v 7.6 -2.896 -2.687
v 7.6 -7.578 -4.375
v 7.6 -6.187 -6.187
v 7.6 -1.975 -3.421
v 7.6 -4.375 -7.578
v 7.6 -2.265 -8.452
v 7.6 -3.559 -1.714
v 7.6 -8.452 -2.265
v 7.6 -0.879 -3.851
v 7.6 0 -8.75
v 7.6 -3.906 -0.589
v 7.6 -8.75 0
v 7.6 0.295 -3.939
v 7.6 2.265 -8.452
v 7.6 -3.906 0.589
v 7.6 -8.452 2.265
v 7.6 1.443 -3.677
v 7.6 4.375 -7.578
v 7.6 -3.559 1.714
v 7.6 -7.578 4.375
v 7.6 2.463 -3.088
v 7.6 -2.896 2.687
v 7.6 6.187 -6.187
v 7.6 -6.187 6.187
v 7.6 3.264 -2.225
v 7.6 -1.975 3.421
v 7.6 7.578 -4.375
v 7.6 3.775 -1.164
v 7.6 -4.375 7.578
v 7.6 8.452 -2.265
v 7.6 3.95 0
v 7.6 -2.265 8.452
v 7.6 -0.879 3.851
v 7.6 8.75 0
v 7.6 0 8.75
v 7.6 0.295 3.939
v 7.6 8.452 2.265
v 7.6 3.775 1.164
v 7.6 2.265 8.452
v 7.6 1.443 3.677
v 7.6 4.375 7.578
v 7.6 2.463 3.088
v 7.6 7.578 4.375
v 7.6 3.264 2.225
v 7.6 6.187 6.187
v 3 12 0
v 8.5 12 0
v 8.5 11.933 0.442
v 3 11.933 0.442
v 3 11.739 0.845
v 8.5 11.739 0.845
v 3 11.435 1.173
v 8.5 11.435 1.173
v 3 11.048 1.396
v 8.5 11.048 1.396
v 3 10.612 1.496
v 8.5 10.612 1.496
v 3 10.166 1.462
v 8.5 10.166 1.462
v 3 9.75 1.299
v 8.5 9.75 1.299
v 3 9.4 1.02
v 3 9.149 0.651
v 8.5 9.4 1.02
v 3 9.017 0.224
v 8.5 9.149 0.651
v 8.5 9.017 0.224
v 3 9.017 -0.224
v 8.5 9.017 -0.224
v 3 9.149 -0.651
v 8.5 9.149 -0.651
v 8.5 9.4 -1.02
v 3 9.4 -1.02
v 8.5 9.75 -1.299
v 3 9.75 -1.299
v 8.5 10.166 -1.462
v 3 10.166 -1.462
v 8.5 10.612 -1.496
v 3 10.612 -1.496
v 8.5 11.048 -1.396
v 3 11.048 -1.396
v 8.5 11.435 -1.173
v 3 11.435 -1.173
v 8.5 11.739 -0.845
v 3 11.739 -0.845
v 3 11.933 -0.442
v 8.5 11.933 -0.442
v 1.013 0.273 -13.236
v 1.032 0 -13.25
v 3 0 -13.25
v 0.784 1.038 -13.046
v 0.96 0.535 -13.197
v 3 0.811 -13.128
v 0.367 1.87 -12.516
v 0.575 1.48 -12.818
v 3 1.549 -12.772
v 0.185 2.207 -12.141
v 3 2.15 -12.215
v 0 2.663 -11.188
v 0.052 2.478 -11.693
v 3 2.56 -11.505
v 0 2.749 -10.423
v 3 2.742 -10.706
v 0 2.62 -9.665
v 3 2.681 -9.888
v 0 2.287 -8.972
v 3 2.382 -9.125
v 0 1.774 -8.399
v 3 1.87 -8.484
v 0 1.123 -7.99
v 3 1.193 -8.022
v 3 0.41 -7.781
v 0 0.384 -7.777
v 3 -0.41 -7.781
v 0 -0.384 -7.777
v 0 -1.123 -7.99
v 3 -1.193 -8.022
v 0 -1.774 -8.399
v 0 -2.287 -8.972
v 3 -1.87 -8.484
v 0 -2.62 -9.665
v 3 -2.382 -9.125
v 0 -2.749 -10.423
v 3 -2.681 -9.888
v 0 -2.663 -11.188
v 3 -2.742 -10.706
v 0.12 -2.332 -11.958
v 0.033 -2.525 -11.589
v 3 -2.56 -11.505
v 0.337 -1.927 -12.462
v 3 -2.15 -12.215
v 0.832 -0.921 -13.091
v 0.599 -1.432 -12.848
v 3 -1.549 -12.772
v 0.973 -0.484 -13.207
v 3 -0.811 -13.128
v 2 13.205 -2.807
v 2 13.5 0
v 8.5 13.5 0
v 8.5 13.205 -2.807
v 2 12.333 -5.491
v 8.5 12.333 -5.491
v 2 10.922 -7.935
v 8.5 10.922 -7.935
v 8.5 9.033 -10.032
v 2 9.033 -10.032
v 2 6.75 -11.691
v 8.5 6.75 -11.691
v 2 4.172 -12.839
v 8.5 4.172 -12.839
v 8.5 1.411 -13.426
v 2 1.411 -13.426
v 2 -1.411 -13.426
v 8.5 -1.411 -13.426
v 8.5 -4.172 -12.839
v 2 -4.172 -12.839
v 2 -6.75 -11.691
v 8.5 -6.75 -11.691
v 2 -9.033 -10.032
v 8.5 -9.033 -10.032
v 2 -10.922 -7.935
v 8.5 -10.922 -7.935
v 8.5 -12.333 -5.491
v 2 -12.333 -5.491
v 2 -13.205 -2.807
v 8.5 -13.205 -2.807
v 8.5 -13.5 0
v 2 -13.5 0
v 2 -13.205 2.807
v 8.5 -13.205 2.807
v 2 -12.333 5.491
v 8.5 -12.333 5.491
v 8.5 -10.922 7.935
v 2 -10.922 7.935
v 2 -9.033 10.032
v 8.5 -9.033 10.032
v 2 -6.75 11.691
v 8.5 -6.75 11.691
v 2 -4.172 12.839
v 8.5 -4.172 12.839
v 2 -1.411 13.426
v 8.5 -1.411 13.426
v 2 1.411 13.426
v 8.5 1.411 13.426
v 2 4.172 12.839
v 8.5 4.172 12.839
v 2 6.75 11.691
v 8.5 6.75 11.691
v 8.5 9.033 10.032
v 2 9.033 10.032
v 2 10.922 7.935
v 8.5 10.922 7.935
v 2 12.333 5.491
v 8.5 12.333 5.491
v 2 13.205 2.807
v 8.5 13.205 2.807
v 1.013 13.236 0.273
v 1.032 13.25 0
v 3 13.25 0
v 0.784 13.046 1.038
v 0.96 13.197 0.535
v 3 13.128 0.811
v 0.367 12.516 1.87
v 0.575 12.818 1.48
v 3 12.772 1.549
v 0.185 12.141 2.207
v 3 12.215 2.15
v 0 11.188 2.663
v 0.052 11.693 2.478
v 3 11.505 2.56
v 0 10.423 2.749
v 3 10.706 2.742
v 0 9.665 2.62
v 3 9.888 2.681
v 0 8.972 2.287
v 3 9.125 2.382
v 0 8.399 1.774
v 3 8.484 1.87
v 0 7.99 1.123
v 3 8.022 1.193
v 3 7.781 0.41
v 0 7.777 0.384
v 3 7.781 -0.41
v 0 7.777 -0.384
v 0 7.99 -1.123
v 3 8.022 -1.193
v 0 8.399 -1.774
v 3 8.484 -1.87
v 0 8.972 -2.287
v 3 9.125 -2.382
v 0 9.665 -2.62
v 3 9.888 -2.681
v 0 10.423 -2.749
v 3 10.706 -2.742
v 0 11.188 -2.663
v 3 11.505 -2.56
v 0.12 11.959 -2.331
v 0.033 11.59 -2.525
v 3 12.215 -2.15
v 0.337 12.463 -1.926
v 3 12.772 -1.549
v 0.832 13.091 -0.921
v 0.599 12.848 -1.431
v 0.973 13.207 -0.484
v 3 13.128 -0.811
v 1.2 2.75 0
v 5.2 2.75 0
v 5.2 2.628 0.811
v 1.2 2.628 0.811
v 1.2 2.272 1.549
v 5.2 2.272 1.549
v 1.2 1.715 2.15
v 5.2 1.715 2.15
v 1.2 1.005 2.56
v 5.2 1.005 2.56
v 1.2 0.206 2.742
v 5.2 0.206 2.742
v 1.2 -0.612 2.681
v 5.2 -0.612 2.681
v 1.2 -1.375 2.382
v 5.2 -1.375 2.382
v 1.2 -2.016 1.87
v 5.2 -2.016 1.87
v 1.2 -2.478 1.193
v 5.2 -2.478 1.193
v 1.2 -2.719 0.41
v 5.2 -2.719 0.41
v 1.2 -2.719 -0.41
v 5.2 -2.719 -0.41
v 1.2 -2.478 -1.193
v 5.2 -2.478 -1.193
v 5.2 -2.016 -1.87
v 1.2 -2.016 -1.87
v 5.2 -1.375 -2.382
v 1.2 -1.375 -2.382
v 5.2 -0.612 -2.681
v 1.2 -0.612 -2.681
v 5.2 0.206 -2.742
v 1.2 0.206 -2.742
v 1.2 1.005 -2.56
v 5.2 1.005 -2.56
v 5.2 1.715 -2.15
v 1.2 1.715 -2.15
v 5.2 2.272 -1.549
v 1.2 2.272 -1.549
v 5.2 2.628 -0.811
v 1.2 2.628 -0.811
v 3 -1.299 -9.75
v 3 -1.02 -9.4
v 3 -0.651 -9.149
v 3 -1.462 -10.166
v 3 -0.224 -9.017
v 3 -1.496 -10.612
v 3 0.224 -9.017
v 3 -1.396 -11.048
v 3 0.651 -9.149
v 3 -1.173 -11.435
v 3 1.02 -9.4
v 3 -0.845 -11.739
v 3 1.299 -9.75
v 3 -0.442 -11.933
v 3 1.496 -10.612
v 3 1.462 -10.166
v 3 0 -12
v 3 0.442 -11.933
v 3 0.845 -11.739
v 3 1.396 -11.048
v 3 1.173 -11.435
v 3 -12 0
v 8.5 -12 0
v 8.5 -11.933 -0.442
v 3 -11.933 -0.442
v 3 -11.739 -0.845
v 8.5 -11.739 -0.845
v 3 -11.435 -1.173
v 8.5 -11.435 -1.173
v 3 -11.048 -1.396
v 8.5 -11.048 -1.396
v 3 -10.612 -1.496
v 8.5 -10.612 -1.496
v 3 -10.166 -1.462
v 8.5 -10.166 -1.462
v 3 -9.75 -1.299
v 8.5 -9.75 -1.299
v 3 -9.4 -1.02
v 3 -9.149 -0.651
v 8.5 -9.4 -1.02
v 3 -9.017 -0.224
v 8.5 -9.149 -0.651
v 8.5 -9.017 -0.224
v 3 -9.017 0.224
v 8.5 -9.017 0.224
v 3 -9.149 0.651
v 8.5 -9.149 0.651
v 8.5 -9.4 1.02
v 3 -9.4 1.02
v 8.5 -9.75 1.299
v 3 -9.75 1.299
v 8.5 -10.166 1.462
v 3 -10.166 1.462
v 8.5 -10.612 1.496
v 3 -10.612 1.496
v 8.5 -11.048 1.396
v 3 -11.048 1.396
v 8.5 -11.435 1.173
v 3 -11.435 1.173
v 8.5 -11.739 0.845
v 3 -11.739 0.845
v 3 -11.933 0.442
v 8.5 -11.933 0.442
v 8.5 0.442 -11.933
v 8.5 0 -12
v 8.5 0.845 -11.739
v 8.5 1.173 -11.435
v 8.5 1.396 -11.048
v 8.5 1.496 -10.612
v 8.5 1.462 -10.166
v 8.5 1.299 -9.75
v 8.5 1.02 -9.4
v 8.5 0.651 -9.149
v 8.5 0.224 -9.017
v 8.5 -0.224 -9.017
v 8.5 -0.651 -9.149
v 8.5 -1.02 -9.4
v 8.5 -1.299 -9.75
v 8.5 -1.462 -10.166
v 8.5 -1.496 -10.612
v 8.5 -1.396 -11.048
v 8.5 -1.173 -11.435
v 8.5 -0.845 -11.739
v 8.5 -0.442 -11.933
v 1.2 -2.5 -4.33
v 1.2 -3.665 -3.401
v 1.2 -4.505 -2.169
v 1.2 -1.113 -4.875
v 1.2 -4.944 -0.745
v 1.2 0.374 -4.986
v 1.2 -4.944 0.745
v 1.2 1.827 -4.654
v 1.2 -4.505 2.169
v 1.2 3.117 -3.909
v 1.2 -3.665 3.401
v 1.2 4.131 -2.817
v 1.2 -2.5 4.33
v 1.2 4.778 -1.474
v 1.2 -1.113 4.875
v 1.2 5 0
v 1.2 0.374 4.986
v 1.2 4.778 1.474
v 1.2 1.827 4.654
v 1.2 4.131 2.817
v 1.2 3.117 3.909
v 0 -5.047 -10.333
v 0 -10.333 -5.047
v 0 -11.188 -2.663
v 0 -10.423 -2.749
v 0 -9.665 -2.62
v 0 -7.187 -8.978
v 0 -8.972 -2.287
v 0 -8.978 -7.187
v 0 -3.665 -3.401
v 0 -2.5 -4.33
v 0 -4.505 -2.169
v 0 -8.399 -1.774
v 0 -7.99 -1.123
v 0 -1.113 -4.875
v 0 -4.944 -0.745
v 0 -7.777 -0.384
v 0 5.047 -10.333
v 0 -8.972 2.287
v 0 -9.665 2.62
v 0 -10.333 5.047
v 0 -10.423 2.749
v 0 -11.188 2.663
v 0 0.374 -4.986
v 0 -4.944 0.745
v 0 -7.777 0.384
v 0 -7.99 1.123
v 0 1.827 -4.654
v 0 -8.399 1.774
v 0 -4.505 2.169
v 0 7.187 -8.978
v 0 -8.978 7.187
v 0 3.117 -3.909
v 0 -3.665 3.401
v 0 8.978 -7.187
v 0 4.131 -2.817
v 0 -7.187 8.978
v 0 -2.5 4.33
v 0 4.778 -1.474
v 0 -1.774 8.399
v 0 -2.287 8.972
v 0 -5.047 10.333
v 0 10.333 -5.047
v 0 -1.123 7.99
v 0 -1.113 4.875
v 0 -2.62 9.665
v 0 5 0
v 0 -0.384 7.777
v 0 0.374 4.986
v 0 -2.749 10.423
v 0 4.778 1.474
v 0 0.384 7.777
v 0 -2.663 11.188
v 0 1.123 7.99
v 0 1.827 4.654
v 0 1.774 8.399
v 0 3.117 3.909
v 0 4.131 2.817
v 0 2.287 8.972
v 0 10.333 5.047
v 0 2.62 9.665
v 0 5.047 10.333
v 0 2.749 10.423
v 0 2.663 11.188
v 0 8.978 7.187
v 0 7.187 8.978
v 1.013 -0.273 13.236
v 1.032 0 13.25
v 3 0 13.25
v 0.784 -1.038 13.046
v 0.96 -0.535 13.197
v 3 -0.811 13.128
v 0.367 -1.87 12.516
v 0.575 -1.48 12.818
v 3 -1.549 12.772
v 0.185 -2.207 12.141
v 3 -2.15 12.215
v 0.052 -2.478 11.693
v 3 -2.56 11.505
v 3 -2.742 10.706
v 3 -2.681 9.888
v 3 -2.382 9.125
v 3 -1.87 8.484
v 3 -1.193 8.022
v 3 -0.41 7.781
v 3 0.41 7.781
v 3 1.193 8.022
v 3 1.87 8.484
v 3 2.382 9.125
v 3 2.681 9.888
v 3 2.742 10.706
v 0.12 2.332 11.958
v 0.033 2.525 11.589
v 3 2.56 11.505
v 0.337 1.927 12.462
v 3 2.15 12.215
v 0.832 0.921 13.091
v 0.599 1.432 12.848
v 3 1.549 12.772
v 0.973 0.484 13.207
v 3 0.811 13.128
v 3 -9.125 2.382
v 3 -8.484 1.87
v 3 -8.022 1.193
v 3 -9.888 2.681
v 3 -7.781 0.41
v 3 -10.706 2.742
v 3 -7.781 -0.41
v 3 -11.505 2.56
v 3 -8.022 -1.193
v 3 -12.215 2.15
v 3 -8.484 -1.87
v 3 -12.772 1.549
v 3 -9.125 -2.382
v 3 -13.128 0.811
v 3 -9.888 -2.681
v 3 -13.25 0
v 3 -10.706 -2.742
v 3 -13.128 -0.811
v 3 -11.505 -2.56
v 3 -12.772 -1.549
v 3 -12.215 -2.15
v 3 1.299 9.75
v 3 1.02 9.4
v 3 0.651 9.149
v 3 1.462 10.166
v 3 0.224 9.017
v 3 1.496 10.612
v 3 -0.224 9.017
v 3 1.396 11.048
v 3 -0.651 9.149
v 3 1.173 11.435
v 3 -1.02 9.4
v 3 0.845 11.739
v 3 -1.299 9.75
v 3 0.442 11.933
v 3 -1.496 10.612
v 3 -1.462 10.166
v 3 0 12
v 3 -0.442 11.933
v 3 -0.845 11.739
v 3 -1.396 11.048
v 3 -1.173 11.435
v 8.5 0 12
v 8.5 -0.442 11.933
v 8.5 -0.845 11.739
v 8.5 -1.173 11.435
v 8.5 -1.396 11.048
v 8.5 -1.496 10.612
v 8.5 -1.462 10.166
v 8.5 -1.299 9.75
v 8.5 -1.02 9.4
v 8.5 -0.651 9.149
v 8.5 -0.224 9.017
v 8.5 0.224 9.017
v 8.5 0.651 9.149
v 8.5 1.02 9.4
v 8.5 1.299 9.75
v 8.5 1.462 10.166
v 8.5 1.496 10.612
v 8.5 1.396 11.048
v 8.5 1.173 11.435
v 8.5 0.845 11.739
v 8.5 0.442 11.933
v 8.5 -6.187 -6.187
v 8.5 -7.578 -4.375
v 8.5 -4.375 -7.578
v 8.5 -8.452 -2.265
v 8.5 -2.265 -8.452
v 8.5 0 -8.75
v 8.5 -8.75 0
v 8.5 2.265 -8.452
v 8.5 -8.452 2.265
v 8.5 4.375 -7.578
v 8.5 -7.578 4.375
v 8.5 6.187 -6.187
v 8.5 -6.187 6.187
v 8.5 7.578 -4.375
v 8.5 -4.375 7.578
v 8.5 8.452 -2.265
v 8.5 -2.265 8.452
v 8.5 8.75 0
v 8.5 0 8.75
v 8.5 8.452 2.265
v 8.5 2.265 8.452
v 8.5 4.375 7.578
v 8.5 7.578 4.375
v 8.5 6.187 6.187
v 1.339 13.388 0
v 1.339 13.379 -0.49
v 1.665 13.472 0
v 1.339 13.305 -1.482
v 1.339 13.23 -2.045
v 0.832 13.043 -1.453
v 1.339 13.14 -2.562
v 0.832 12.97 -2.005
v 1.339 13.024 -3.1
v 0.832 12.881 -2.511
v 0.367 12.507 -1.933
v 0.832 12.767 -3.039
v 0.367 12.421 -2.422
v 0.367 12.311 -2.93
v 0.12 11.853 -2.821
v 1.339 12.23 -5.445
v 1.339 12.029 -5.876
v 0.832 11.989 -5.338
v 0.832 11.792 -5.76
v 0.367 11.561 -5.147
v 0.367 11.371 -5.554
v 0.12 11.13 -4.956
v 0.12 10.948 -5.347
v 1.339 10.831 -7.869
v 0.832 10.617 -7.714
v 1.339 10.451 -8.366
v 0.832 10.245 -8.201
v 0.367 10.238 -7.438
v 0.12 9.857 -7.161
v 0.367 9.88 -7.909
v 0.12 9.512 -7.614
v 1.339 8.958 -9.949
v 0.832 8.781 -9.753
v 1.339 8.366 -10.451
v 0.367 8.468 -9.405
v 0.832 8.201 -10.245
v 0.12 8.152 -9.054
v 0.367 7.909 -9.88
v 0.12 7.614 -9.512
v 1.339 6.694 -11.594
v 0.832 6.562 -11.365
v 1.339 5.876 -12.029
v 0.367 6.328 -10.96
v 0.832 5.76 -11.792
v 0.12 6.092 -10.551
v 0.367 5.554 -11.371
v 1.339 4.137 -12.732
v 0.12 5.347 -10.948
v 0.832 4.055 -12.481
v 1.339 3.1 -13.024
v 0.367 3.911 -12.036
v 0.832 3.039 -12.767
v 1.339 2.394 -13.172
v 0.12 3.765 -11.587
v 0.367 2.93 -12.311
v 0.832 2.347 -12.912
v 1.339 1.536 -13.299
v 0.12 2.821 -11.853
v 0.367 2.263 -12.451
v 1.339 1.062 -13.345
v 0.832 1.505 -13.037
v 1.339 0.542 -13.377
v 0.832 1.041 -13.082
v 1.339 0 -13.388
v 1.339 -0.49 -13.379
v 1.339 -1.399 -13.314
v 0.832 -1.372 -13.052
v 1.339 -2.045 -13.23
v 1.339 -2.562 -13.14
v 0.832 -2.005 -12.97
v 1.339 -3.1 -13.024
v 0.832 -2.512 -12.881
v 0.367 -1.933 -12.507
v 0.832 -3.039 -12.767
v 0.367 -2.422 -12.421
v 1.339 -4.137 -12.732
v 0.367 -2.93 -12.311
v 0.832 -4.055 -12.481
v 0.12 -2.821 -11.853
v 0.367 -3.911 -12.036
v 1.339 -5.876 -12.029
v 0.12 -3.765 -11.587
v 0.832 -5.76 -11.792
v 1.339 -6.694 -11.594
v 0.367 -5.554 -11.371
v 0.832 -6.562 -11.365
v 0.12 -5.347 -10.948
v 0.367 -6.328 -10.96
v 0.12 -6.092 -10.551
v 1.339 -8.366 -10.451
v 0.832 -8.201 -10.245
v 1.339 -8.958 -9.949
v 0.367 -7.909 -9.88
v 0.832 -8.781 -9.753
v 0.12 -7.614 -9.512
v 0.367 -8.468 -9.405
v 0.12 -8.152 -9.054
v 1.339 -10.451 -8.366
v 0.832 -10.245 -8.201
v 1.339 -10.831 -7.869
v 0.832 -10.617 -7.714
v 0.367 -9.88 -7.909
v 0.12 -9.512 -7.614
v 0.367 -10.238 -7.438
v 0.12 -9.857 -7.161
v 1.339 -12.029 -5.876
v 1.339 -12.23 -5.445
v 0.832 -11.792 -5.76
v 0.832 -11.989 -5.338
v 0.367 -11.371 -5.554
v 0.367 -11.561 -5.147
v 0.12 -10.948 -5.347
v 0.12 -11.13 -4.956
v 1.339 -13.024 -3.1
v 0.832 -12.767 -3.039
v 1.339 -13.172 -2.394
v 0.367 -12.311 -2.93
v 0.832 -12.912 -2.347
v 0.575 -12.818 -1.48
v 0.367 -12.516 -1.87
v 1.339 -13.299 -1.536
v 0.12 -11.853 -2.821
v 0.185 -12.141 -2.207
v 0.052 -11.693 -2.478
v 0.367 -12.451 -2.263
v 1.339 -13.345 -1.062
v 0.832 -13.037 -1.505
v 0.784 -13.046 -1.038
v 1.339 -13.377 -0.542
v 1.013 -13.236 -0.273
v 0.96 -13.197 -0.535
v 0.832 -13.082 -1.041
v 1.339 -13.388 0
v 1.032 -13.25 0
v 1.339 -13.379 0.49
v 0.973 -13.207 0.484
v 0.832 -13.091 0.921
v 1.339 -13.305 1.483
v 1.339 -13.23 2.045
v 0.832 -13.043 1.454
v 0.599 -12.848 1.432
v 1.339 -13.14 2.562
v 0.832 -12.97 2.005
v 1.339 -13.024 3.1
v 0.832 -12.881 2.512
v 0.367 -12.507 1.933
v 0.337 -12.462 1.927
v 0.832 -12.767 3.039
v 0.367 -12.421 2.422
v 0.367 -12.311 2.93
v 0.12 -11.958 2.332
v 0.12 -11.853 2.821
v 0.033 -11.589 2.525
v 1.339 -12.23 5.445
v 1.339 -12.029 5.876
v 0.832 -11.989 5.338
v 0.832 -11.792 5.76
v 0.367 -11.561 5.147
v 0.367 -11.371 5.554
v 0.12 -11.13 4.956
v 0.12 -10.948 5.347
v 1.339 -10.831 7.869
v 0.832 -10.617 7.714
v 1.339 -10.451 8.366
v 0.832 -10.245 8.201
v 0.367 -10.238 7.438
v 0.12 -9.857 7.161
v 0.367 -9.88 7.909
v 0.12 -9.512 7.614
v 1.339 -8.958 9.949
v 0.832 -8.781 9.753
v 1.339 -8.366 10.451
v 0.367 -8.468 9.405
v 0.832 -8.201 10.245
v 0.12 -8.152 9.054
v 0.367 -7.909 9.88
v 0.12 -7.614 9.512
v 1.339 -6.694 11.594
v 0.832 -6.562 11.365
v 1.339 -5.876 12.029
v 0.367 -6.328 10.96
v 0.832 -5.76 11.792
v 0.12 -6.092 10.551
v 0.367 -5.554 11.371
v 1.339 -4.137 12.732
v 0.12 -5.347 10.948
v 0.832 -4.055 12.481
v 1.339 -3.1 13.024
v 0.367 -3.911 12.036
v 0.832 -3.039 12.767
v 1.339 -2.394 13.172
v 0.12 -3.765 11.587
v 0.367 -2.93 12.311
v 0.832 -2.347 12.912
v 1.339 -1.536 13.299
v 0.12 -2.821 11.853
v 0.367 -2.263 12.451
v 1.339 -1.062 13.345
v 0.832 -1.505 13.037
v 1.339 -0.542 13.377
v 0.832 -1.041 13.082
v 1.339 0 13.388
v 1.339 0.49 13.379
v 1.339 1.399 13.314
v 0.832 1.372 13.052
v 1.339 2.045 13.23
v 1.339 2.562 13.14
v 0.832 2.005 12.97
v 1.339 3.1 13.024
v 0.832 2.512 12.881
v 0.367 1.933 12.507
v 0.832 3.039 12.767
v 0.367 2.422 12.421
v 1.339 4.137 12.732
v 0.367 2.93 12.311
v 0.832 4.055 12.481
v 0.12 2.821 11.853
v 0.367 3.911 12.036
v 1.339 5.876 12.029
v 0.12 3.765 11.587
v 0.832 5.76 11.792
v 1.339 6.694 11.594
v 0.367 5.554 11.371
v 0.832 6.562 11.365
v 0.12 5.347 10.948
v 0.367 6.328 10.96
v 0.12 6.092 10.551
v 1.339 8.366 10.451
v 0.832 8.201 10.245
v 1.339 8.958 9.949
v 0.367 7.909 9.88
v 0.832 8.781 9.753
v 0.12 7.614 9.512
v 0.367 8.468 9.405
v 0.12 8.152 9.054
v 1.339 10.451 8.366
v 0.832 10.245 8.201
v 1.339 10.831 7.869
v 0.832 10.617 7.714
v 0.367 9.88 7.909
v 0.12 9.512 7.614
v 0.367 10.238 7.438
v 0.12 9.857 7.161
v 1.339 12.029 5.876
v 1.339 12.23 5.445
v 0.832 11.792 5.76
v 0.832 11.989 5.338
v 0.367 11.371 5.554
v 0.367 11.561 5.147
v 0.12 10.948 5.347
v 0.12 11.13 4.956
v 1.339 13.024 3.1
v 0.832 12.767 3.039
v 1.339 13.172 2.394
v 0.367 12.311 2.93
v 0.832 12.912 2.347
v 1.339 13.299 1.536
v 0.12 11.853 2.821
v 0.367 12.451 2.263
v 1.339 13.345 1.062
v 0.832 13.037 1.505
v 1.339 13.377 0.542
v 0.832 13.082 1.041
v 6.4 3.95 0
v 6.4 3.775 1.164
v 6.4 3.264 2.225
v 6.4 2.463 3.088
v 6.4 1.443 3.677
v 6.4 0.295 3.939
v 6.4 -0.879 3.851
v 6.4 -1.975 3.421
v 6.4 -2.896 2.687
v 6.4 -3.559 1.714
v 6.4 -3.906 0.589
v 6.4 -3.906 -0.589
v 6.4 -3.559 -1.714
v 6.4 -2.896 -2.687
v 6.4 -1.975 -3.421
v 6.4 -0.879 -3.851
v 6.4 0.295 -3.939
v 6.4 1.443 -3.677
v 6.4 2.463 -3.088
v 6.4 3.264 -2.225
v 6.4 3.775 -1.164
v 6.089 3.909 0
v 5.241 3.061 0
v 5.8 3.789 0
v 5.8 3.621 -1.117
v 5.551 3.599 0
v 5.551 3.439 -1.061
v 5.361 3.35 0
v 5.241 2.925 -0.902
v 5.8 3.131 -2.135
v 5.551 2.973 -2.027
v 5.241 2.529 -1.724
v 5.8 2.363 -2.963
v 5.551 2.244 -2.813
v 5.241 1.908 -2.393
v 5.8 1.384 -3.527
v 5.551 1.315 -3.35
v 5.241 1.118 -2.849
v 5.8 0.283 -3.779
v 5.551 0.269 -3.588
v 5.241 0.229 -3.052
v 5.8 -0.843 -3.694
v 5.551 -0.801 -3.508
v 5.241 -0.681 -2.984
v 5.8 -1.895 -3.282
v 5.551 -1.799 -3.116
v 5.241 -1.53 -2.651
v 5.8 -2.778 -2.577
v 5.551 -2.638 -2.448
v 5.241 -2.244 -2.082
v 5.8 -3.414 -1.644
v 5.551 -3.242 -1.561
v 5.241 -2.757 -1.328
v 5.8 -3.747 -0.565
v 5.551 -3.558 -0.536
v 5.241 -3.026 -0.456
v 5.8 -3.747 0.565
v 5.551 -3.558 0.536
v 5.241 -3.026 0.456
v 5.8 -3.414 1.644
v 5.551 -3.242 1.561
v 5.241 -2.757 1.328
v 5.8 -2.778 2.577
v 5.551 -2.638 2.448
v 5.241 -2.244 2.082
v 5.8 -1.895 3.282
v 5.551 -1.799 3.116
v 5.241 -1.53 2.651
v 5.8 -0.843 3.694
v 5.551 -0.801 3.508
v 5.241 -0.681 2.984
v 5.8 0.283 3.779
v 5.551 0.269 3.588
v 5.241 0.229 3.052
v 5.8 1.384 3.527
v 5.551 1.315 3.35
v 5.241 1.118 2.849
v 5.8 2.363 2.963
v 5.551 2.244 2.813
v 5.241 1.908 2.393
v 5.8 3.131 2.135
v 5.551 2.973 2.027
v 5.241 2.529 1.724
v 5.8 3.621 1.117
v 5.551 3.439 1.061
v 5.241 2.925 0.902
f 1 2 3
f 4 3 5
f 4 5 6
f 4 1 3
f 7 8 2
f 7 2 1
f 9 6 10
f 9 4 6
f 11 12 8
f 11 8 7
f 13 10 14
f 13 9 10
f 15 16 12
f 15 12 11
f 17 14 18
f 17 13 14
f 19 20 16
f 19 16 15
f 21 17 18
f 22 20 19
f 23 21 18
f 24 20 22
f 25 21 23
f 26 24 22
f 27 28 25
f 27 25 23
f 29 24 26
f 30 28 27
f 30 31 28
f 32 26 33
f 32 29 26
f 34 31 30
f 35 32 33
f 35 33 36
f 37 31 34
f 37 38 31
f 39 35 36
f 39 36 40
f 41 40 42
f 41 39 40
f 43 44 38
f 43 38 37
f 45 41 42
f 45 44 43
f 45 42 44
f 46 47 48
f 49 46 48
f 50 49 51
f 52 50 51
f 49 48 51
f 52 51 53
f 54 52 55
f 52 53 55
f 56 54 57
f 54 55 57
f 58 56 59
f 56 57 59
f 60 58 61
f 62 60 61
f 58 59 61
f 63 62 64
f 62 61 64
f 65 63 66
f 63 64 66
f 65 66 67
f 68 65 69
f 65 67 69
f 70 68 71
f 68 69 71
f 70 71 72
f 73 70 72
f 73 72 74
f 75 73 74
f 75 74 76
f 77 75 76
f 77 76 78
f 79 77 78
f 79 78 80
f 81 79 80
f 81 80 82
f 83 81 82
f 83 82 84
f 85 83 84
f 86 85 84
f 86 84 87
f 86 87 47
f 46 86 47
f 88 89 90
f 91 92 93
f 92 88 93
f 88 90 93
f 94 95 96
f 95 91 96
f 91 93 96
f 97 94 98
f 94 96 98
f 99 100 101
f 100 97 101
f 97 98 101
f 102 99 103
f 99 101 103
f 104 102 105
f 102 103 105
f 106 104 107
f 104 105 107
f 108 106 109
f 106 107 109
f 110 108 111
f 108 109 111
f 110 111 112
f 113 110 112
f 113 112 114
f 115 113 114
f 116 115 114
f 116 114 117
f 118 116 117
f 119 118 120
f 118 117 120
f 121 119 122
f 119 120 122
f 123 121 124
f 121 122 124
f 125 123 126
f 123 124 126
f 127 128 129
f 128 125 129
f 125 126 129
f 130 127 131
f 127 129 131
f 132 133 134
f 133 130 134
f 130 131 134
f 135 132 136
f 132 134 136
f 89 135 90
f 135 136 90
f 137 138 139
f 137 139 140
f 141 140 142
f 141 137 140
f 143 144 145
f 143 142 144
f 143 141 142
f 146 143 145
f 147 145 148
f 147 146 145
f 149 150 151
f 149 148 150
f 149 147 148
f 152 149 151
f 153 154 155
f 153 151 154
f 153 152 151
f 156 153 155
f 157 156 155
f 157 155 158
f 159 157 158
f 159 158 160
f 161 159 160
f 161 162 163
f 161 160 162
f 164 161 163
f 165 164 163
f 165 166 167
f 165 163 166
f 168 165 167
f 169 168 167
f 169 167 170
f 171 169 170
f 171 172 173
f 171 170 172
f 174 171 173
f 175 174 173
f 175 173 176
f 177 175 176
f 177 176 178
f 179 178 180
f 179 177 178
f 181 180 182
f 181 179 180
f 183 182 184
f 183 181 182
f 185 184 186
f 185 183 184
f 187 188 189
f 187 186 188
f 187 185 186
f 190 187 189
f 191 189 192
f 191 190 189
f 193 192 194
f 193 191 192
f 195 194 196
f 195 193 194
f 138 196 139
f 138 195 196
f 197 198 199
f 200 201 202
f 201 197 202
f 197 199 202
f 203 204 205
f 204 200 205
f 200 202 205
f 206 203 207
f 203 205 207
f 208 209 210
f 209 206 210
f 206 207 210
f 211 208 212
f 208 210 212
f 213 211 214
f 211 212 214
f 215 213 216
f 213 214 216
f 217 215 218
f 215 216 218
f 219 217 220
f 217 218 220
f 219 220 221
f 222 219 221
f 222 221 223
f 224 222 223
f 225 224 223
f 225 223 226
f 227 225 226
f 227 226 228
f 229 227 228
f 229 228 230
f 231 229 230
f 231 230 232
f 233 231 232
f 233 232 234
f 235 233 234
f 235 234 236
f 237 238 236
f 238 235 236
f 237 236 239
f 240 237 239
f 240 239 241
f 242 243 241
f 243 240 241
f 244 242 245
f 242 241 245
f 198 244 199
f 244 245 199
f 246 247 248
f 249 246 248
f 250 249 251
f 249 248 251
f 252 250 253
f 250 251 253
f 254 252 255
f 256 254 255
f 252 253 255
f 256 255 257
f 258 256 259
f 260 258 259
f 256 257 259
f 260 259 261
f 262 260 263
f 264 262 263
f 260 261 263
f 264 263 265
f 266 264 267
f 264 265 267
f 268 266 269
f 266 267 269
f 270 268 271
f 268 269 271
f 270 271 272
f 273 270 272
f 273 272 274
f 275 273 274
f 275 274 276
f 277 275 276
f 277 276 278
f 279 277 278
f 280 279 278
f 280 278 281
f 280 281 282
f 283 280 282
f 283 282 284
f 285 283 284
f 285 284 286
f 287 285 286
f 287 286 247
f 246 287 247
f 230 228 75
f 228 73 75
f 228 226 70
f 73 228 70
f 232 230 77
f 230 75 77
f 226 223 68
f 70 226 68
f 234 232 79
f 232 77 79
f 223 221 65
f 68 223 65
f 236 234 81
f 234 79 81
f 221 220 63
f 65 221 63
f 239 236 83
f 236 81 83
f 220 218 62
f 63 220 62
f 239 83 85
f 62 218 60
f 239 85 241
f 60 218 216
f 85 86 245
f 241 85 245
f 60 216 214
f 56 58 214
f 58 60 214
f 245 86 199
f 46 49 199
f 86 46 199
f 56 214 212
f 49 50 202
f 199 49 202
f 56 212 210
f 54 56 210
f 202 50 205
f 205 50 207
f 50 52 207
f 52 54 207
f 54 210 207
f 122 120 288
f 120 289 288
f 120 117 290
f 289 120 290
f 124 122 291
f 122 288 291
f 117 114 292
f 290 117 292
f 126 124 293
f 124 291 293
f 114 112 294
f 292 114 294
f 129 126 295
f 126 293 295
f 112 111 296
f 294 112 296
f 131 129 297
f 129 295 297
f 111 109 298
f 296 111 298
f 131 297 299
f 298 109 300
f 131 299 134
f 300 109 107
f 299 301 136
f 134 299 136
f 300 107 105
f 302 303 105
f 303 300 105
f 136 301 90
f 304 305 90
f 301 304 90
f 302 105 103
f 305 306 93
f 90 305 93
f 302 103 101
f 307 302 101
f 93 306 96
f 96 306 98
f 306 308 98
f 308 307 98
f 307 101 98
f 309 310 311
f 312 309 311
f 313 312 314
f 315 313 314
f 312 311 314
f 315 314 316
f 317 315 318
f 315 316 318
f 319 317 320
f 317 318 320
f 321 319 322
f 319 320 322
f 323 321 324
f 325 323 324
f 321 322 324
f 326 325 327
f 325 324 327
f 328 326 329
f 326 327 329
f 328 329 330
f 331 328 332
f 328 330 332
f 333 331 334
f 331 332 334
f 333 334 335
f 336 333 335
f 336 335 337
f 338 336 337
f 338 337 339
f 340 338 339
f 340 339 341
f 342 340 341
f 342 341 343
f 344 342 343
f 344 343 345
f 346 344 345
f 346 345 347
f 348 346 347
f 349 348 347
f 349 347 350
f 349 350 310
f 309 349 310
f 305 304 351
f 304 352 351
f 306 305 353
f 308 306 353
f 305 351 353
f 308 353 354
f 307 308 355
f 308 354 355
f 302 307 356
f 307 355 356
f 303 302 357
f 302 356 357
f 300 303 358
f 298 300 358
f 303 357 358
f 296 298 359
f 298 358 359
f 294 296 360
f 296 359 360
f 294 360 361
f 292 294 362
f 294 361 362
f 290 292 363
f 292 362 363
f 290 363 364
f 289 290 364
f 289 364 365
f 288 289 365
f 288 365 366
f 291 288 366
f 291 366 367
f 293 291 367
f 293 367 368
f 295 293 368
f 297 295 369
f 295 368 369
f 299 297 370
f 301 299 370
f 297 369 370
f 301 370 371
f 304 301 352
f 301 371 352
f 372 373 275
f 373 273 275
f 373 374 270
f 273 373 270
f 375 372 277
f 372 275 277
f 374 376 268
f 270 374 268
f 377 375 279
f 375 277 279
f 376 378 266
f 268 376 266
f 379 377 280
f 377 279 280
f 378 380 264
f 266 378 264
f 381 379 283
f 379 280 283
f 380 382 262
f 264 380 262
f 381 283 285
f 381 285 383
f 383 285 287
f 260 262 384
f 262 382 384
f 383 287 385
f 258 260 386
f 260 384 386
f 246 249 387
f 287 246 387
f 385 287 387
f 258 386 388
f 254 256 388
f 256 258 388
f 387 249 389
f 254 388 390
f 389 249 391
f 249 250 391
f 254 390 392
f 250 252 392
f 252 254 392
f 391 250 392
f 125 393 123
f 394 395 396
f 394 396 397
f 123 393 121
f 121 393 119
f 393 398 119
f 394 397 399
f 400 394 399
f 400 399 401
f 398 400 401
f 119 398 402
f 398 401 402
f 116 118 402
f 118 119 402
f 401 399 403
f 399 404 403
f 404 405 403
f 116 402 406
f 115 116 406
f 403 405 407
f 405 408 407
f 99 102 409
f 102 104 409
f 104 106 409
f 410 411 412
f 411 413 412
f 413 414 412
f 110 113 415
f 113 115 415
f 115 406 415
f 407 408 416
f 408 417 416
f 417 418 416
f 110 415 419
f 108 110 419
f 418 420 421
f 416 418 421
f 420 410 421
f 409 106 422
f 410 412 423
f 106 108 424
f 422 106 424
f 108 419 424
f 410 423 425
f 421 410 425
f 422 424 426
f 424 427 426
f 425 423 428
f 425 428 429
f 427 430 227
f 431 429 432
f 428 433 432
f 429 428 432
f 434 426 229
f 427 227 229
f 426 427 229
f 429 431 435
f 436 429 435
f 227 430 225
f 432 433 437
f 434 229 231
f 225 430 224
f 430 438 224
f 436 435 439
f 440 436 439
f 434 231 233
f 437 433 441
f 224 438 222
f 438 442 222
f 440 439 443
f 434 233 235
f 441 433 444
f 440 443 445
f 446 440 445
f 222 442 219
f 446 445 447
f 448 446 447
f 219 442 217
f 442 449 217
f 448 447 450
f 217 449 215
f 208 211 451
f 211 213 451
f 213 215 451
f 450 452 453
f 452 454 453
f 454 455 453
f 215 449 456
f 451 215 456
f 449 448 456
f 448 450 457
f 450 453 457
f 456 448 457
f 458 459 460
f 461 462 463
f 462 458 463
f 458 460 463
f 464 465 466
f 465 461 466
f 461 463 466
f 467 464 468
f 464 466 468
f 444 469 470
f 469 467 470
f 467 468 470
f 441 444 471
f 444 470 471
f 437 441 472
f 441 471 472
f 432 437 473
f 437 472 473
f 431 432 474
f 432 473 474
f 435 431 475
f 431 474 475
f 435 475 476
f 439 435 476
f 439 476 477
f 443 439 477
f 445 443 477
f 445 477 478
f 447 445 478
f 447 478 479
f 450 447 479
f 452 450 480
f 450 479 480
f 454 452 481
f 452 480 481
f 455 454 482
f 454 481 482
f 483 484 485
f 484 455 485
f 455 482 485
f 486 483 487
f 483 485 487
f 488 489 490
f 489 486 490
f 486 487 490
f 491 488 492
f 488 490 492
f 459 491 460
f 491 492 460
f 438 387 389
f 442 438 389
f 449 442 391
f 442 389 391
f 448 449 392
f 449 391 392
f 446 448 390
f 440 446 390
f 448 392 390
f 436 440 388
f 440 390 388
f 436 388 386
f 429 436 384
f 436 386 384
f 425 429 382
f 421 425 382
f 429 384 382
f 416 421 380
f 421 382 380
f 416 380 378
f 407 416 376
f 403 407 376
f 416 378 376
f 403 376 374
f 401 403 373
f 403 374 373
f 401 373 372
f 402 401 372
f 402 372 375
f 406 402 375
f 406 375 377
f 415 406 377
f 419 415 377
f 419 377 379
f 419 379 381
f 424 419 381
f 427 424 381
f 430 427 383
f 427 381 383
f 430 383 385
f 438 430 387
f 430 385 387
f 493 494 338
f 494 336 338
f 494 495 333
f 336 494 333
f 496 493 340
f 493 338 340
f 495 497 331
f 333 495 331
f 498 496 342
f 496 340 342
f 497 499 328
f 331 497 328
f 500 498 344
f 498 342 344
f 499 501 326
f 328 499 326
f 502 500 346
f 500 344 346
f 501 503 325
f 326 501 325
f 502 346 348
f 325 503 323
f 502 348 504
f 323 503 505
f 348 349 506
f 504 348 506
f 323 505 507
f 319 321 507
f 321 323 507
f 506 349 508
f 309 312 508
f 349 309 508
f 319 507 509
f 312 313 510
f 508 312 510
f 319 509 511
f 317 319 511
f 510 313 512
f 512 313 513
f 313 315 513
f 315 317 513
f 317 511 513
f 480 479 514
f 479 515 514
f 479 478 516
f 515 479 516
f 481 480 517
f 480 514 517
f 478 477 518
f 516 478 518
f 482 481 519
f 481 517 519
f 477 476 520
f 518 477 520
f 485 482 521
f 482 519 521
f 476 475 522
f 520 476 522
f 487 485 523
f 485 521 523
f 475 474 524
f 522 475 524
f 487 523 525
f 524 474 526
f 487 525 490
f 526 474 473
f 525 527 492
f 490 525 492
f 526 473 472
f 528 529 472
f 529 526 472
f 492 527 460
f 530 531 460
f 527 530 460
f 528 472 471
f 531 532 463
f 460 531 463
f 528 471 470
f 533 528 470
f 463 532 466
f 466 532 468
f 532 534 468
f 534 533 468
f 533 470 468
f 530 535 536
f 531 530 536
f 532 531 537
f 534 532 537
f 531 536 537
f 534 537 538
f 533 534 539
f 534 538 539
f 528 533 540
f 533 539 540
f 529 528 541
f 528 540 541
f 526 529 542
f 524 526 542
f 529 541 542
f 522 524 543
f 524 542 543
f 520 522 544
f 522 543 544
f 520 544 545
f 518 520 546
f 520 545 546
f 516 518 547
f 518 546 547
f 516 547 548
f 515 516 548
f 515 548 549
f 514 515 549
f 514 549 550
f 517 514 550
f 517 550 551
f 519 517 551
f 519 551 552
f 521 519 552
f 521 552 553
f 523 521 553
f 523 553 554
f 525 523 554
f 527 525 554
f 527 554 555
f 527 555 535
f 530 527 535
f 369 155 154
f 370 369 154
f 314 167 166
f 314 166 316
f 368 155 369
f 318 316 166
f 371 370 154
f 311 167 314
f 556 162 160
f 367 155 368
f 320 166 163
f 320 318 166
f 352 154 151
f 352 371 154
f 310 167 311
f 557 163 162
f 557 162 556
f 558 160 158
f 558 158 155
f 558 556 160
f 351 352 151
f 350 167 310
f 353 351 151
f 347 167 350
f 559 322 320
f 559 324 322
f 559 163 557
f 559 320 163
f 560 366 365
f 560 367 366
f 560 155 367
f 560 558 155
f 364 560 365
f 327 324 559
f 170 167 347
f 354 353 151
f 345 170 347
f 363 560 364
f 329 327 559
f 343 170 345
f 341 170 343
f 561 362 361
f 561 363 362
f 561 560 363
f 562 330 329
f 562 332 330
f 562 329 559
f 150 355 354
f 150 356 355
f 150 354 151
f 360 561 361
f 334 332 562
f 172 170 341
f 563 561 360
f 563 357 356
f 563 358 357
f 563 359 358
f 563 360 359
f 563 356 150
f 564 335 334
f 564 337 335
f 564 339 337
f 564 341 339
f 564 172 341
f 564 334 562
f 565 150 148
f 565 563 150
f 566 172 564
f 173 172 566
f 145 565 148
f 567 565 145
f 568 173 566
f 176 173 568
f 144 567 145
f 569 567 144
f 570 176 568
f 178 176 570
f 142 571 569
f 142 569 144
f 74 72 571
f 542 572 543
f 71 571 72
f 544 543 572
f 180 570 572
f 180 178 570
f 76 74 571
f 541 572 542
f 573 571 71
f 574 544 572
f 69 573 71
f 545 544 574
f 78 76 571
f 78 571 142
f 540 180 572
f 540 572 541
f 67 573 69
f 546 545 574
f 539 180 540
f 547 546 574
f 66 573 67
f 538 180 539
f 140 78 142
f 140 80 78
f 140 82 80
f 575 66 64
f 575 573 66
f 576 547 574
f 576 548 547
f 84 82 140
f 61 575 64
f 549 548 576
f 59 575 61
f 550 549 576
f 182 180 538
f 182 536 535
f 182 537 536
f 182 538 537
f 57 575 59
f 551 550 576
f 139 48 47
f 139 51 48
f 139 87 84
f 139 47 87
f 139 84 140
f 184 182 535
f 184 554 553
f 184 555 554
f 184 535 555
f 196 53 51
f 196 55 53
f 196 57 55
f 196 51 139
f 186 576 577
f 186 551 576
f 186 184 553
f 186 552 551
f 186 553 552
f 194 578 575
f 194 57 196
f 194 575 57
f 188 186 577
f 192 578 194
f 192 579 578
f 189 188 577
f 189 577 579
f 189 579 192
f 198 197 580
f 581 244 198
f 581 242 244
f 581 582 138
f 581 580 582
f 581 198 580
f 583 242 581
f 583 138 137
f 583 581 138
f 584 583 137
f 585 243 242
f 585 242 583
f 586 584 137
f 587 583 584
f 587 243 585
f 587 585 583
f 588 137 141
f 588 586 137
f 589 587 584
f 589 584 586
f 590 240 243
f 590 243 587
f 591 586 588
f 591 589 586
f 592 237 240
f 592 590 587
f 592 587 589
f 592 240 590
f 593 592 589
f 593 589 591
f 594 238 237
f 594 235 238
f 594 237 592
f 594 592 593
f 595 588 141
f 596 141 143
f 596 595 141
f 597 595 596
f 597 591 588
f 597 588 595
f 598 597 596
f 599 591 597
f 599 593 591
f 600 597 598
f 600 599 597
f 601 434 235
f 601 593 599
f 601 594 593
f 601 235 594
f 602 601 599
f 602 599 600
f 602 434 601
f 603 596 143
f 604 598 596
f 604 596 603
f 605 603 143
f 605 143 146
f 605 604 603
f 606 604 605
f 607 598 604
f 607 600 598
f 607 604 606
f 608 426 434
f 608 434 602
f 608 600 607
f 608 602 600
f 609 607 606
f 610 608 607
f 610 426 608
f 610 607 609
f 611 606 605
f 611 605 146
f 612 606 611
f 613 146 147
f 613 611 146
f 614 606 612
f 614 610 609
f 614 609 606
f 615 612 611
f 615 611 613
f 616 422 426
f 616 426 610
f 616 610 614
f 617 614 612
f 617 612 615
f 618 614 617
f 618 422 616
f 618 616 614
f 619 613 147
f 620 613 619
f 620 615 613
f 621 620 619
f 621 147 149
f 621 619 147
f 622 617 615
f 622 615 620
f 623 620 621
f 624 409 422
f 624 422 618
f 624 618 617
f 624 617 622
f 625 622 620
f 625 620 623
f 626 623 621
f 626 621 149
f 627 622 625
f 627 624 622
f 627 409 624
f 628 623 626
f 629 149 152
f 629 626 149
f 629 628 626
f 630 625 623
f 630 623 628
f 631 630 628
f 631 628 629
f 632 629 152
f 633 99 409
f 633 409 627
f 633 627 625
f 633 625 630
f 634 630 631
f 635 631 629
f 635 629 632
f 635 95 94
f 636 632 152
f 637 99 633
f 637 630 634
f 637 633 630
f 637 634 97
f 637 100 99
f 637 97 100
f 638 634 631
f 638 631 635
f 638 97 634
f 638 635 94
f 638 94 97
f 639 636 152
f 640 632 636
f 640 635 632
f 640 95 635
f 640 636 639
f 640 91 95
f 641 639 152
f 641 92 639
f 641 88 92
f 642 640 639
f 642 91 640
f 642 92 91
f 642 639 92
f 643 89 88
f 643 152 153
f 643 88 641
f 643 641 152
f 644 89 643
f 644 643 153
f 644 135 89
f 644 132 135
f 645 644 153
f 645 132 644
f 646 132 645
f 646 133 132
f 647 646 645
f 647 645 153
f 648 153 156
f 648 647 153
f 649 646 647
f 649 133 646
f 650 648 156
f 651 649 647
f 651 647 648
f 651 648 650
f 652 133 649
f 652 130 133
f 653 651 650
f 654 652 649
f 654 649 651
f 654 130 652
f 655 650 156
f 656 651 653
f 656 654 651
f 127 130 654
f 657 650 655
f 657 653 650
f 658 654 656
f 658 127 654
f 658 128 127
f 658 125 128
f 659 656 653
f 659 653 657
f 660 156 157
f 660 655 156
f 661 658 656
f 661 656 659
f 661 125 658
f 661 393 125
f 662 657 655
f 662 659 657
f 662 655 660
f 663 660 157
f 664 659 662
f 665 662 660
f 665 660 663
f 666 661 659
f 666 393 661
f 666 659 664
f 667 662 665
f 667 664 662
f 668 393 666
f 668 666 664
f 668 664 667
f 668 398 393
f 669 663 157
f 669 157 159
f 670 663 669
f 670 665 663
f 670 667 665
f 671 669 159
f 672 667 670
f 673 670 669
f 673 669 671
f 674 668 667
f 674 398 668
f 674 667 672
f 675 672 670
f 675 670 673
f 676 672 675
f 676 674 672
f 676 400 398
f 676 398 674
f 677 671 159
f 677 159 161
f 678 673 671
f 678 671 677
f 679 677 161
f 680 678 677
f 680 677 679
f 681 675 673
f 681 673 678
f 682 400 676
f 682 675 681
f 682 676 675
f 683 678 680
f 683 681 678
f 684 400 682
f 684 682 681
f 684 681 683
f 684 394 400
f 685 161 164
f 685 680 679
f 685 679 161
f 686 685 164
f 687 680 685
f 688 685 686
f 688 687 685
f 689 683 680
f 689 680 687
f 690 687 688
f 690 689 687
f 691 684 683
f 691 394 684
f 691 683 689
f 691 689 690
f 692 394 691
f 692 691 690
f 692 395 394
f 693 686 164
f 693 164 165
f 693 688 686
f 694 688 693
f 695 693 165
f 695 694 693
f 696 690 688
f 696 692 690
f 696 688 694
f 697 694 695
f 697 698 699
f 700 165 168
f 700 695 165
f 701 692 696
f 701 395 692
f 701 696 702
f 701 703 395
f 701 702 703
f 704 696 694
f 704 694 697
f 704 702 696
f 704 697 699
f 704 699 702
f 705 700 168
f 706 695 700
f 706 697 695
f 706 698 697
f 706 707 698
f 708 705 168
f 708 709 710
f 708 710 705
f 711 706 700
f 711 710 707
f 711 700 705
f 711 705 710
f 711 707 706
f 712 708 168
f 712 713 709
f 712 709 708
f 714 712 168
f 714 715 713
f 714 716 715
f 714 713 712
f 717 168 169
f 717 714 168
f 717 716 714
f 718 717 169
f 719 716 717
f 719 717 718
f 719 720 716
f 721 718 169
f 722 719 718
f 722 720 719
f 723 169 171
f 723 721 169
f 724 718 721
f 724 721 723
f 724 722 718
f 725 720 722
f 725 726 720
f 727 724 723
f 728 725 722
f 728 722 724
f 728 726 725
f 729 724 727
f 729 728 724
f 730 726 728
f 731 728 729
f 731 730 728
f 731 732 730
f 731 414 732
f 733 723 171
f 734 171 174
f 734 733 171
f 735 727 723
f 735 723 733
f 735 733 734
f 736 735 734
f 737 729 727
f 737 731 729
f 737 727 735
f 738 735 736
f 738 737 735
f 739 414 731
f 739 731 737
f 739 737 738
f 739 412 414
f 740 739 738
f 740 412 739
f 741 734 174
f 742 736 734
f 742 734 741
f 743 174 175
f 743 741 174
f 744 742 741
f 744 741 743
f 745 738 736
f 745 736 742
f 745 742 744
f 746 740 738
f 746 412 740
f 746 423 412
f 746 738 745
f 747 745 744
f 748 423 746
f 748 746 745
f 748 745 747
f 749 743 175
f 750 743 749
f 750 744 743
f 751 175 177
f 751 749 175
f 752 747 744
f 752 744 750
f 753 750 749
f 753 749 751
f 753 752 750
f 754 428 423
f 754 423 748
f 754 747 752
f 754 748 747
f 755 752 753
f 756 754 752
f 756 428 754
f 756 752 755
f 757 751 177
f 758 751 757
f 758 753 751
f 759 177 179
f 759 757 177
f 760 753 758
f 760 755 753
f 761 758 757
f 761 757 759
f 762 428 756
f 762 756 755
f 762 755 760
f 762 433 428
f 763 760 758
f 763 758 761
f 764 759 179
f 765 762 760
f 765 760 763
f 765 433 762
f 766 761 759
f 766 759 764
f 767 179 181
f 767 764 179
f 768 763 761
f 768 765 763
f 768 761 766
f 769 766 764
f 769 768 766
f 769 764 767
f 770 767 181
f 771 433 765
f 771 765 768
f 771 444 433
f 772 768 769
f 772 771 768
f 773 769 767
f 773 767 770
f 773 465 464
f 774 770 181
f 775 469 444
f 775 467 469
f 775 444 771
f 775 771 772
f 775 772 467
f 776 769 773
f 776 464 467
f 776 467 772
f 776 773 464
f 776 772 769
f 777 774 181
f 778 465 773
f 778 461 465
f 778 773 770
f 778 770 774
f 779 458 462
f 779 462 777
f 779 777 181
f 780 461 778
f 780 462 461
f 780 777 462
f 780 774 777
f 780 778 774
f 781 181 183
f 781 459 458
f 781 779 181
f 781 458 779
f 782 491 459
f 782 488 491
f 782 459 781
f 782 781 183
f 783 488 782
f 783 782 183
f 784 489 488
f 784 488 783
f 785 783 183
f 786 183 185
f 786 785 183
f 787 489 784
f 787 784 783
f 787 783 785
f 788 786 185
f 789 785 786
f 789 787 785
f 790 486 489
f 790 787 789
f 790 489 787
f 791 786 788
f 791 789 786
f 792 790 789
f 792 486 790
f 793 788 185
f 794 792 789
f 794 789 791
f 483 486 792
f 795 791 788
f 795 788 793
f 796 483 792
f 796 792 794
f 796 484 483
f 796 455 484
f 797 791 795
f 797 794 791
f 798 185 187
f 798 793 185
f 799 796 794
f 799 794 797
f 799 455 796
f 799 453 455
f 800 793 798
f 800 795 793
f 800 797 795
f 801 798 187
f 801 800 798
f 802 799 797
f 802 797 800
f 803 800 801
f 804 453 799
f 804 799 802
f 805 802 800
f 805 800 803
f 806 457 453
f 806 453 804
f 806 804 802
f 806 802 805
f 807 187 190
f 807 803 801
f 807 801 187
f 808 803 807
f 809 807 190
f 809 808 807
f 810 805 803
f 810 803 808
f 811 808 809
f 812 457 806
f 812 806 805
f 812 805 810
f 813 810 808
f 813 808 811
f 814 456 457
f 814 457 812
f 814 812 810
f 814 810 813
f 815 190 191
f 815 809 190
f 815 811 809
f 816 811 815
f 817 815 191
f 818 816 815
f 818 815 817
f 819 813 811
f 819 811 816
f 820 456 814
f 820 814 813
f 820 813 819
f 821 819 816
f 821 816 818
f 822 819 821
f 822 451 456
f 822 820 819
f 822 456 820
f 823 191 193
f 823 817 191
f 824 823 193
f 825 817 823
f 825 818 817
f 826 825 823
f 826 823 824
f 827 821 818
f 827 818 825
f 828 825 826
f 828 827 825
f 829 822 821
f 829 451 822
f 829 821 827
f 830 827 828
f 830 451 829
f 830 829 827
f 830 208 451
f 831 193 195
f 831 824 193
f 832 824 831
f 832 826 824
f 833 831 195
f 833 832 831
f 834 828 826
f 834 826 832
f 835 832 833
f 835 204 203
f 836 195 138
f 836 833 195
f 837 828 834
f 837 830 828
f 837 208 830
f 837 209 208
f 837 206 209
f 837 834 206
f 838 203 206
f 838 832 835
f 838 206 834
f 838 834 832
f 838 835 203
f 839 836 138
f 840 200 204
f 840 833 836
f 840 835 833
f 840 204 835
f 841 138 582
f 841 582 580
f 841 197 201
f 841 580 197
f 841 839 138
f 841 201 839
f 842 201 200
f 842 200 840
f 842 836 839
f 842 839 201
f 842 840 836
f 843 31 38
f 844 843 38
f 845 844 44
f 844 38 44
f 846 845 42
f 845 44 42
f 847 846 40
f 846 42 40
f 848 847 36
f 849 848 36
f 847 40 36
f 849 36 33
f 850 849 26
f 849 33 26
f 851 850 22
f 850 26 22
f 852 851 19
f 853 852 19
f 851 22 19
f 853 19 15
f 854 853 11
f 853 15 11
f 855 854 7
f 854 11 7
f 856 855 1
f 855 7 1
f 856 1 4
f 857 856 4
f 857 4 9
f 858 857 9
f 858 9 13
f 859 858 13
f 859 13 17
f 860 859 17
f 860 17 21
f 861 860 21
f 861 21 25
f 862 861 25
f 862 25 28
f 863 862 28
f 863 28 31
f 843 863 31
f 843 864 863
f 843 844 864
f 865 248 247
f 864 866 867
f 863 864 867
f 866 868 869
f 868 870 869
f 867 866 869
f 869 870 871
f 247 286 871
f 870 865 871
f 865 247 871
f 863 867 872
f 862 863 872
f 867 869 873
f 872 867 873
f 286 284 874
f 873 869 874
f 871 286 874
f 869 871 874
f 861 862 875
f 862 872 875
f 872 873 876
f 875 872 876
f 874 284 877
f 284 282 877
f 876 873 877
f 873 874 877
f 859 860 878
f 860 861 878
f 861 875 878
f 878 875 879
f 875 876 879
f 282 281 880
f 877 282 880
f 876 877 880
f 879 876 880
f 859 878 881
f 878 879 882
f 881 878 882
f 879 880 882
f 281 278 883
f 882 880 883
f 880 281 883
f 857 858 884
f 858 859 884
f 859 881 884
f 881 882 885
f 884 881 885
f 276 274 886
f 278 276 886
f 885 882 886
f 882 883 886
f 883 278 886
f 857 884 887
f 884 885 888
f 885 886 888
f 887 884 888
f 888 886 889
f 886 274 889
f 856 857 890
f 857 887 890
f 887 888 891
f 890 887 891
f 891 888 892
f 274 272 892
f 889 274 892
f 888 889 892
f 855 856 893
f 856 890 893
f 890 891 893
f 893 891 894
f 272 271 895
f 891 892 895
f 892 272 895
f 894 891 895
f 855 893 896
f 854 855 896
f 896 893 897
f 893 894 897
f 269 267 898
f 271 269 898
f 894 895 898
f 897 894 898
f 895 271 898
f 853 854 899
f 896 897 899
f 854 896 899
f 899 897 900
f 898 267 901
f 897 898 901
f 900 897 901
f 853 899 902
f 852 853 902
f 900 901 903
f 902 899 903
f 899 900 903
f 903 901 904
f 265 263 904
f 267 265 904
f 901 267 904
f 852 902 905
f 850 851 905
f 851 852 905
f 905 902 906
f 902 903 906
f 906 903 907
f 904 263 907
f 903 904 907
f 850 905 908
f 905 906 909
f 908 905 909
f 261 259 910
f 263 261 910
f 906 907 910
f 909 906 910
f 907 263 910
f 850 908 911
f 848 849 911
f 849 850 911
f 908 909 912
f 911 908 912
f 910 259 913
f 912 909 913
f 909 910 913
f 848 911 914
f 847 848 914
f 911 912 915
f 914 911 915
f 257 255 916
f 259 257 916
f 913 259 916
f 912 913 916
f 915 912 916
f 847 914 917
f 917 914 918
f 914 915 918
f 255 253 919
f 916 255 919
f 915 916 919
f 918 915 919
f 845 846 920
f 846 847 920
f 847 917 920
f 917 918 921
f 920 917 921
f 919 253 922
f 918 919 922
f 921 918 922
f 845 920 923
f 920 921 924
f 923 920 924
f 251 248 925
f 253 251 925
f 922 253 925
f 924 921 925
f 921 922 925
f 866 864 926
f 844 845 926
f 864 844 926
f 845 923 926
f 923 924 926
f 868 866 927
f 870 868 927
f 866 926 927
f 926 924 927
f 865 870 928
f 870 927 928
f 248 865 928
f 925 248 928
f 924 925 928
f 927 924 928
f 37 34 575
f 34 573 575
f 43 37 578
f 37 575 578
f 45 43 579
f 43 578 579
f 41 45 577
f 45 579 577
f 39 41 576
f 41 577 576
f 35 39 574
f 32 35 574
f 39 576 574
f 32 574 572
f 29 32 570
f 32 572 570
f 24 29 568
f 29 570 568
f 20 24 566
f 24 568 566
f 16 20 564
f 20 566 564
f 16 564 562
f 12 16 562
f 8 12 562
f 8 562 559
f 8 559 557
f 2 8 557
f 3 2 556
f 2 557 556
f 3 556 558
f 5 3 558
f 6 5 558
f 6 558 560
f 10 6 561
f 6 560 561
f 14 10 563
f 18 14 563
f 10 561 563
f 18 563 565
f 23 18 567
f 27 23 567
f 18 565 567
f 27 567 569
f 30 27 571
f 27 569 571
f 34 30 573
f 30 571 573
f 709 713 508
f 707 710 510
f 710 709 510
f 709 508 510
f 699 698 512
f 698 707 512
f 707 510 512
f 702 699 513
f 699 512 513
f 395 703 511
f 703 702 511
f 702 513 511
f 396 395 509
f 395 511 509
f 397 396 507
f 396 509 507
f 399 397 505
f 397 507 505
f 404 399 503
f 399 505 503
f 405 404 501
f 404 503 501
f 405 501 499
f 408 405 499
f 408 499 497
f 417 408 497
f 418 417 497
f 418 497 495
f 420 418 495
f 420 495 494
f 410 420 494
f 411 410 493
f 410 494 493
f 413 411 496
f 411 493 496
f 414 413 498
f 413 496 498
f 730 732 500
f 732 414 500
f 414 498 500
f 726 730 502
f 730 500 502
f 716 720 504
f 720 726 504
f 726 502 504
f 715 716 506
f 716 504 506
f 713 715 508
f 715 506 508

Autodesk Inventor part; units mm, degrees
ref_plane "YZ-Ebene" through (0, 0, 0) normal (1, 0, 0) x (0, 1, 0)
ref_plane "XZ-Ebene" through (0, 0, 0) normal (0, 1, 0) x (-1, 0, 0)
ref_plane "XY-Ebene" through (0, 0, 0) normal (0, 0, 1) x (1, 0, 0)
sketch "Skizze1" plane through (0, 0, 0) normal (0, 0, 1) x (1, 0, 0)
  line L0 (-2.1971, 0) -> (10.2828, 0) projected
  line L1 (0, -2.7828) -> (0, 16.6971) projected
  line L2 (0, 5) -> (1.2, 5)
  line L3 (1.2, 5) -> (1.2, 2.75)
  line L4 (1.2, 2.75) -> (5.2, 2.75)
  arc A0 (6.4, 3.95) -> (5.2, 2.75) centre (6.4, 2.75) ccw
  line L5 (6.4, 3.95) -> (7.6, 3.95)
  line L6 (7.6, 3.95) -> (7.6, 8.75)
  line L7 (7.6, 8.75) -> (8.5, 8.75)
  line L8 (8.5, 8.75) -> (8.5, 13.5)
  line L9 (8.5, 13.5) -> (2, 13.5)
  arc A1 (2, 13.5) -> (0, 11.5) centre (2, 11.5) ccw
  line L10 (0, 11.5) -> (0, 5)
  point P0 (0, 0)
  dimension "d6" = 2.75
  dimension "d7" = 5
  dimension "d8" = 8.75
  dimension "d9" = 13.5
  dimension "d10" = 1.2
  dimension "d11" = 2.4
  dimension "d12" = 0.9
  dimension "d13" = 1.2
  dimension "d14" = 2
  dimension "d15" = 8.5
revolve "Umdrehung1" add sketch "Skizze1" angle 360 about axis through (-10, 0, 0) along (1, 0, 0)
sketch "Skizze2" plane through (0, 0, 0) normal (-1, 0, 0) x (0, 0, 1)
  circle A0 centre (0, 0) radius 5 projected
  line L0 (-18.9, 0) -> (18.9, 0) projected
  circle A1 centre (0, 0) radius 5 projected
  circle A2 centre (0, 0) radius 11.5 projected
  point P0 (10.5, 0)
  dimension "d18" = 10.5
hole "Bohrung1" at (0, 0, 10.5) direction (1, 0, 0) diameter 3 end through all counterbore diameter 5.5 counterbore depth 3
pattern_circular "Runde Anordnung1" count 4 over 360 about axis through (3.2, 0, 0) along (-1, 0, 0) of "Bohrung1"
thread "Gewinde1" size "M6x0.5" class "6H" standard "ISO Metric profile" length 7
properties part number "Zylinderkopf_ra8846s" material "Stahl, Guss"
